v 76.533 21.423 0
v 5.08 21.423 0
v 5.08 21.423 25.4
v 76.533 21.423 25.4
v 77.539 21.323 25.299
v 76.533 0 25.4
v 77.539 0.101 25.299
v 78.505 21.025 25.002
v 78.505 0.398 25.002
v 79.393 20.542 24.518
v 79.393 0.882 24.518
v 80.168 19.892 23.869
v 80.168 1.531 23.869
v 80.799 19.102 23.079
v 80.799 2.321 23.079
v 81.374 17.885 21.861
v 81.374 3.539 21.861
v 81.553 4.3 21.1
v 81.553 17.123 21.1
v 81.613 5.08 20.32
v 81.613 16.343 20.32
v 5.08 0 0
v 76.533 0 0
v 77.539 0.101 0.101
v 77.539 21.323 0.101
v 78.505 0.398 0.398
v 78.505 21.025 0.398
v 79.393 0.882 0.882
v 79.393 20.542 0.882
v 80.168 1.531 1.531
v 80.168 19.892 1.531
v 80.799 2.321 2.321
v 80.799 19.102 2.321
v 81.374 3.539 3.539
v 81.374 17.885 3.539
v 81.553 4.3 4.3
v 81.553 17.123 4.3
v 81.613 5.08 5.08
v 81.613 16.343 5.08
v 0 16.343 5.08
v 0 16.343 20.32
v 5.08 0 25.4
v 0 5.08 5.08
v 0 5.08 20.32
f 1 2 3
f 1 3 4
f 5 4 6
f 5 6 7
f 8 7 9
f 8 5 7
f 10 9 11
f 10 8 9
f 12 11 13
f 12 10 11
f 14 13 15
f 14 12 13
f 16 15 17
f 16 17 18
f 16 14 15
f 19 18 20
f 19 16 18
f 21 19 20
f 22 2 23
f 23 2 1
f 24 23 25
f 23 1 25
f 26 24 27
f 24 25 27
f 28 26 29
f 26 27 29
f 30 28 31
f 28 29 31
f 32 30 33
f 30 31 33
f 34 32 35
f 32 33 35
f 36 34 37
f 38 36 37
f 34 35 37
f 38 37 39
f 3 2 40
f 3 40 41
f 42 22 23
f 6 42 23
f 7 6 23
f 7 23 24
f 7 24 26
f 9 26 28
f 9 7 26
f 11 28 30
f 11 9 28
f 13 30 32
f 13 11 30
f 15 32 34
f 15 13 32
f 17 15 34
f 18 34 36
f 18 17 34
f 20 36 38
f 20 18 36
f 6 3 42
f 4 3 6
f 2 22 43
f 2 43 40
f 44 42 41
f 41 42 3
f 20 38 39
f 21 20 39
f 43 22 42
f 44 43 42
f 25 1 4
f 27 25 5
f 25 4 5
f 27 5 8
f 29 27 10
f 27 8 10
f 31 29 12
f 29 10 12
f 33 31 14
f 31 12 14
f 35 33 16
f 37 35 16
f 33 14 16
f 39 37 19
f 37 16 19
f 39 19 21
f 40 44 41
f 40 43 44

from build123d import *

# Parameters (mm, degrees)
F0_W     = 81.613116
F0_H     = 21.423442
F1_DEPTH = 25.4
F2_SIZE  = 5.08
F3_R     = 5.08


with BuildPart() as f1:
    # F0 (on Top) → F1 (new body)
    with BuildSketch(Plane.XY):
        with Locations((40.806558, 10.711721)):
            Rectangle(F0_W, F0_H)
    extrude(amount=F1_DEPTH)

    # F2
    f2_edges = [f1.edges().sort_by_distance(p)[0] for p in [
        (0, 10.711721, 25.4),
        (0, 21.423442, 12.7),
        (0, 0, 12.7),
        (0, 10.711721, 0),
    ]]
    chamfer(f2_edges, length=F2_SIZE)

    # F3
    f3_edges = [f1.edges().sort_by_distance(p)[0] for p in [
        (81.613116, 0, 12.7),
        (81.613116, 21.423442, 12.7),
        (81.613116, 10.711721, 0),
        (81.613116, 10.711721, 25.4),
    ]]
    fillet(f3_edges, radius=F3_R)


solid = f1.part
